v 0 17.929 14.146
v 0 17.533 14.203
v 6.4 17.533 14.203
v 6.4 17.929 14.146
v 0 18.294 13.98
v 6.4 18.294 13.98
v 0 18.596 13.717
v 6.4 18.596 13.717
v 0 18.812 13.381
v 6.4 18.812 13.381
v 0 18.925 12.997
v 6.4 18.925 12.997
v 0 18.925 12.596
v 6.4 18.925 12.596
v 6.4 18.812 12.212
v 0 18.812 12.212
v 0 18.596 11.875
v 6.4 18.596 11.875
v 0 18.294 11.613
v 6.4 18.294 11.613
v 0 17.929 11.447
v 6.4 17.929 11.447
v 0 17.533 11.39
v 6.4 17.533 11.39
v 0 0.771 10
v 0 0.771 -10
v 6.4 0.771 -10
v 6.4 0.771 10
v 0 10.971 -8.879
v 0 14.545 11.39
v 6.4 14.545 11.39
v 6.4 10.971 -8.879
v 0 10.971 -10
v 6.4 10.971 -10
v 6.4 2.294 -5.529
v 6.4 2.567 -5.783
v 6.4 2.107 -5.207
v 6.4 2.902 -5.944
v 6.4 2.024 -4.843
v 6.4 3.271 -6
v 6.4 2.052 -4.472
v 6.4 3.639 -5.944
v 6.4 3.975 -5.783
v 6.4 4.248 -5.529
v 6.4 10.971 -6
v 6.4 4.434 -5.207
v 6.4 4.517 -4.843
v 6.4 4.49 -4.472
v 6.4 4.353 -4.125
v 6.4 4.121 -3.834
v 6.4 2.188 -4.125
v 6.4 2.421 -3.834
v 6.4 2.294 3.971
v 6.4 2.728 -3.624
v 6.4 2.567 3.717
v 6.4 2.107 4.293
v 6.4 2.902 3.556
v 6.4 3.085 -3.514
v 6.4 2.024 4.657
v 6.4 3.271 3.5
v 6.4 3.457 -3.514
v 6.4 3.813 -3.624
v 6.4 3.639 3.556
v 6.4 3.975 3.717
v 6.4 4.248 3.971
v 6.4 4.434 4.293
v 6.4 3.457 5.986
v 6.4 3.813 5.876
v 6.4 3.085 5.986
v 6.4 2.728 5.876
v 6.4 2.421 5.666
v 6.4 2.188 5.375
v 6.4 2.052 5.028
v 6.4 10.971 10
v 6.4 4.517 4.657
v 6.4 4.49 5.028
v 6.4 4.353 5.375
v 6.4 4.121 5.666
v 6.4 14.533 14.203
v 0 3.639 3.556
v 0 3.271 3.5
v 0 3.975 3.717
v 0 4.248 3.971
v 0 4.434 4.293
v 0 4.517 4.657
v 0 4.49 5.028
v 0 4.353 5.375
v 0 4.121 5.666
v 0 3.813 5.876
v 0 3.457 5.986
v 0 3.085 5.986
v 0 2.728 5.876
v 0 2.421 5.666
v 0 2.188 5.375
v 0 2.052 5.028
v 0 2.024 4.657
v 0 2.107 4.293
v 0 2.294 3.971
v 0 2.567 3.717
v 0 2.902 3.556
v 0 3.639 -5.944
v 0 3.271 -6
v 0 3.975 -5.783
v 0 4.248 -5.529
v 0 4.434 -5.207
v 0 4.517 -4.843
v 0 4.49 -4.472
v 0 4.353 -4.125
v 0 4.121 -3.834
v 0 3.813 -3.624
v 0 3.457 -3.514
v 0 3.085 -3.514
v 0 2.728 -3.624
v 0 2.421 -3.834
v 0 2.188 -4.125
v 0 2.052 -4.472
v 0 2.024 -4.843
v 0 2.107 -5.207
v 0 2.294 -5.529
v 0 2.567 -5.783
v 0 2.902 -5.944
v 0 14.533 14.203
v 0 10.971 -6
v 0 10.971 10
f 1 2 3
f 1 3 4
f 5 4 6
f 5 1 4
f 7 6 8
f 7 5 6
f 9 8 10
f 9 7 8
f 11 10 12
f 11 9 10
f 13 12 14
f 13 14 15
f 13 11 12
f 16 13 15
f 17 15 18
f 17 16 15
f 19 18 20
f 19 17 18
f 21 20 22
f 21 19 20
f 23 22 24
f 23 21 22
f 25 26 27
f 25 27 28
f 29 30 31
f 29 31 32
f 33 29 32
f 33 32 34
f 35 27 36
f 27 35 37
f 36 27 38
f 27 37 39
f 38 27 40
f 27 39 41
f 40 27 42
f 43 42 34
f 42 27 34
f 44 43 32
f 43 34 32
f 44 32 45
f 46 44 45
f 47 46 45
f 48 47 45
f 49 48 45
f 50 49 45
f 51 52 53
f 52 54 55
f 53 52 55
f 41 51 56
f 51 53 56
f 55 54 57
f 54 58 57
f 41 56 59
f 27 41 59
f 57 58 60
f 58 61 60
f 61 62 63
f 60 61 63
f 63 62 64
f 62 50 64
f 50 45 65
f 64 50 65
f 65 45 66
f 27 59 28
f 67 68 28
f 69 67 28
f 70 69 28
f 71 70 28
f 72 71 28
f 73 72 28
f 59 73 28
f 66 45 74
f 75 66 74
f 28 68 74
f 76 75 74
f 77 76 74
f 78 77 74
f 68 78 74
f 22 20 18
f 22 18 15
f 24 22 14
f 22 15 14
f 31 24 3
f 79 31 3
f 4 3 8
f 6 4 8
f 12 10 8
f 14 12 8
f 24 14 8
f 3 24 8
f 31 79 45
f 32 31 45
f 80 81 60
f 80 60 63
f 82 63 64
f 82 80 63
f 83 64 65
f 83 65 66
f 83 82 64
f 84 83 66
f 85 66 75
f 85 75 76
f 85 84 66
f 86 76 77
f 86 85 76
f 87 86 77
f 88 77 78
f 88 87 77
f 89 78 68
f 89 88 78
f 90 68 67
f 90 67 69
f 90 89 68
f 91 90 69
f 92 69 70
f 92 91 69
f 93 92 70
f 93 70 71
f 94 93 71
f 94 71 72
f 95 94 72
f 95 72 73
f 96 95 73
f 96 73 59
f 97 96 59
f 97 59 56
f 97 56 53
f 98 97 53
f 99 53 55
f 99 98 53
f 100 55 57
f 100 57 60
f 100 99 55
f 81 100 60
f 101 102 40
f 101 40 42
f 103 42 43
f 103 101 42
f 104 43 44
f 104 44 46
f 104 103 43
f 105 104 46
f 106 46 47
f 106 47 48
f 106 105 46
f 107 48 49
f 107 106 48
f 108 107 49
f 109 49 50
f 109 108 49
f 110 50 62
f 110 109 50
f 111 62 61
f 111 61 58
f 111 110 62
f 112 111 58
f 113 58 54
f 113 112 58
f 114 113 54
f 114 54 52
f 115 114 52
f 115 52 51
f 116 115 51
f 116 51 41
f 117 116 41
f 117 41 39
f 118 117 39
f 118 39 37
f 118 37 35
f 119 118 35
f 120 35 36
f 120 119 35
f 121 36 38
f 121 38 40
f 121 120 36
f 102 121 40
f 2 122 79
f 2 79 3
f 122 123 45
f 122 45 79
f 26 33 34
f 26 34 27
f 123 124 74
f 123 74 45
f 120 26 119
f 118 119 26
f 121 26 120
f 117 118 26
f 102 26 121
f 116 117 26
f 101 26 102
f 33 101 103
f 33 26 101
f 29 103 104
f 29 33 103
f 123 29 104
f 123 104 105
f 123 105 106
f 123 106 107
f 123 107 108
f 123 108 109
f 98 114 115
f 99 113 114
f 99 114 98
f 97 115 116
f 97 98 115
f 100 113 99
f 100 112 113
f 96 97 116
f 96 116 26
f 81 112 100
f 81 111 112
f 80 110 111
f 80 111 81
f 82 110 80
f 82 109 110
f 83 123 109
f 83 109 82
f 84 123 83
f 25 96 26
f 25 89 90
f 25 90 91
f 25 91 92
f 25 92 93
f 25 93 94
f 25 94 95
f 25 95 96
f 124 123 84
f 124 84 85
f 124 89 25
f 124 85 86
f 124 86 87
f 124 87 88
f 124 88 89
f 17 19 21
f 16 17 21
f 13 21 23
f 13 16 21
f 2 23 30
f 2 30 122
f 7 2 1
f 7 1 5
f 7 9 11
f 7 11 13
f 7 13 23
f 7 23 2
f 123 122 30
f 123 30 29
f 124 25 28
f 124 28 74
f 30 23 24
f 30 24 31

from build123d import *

# Parameters (mm, degrees)
SKETCH_1_R      = 1.25
EXTRUDE_1_DEPTH = 6.4


with BuildPart() as part:
    # 草图1 → 凸台-拉伸1 (new body)
    with BuildSketch(Plane(origin=(0, 0, 0), x_dir=(0, 0, -1), z_dir=(1, 0, 0))):
        with BuildLine():
            Line((-10, 10.970845222), (6, 10.970845222))
            Line((6, 10.970845222), (-14.202813689, 14.533146362))
            Line((-14.202813689, 14.533146362), (-14.202813689, 17.533146362))
            ThreePointArc((-14.202813689, 17.533146362), (-12.796398802, 18.939561248), (-11.389983916, 17.533146362))
            Line((-11.389983916, 17.533146362), (-11.389983916, 14.544881886))
            Line((-11.389983916, 14.544881886), (8.879385242, 10.970845222))
            Line((8.879385242, 10.970845222), (10, 10.970845222))
            Line((10, 10.970845222), (10, 0.770845222))
            Line((10, 0.770845222), (-10, 0.770845222))
            Line((-10, 0.770845222), (-10, 10.970845222))
        make_face()
        with Locations((-4.75, 3.270845222)):
            Circle(SKETCH_1_R, mode=Mode.SUBTRACT)
        with Locations((4.75, 3.270845222)):
            Circle(SKETCH_1_R, mode=Mode.SUBTRACT)
    extrude(amount=EXTRUDE_1_DEPTH)


solid = part.part
